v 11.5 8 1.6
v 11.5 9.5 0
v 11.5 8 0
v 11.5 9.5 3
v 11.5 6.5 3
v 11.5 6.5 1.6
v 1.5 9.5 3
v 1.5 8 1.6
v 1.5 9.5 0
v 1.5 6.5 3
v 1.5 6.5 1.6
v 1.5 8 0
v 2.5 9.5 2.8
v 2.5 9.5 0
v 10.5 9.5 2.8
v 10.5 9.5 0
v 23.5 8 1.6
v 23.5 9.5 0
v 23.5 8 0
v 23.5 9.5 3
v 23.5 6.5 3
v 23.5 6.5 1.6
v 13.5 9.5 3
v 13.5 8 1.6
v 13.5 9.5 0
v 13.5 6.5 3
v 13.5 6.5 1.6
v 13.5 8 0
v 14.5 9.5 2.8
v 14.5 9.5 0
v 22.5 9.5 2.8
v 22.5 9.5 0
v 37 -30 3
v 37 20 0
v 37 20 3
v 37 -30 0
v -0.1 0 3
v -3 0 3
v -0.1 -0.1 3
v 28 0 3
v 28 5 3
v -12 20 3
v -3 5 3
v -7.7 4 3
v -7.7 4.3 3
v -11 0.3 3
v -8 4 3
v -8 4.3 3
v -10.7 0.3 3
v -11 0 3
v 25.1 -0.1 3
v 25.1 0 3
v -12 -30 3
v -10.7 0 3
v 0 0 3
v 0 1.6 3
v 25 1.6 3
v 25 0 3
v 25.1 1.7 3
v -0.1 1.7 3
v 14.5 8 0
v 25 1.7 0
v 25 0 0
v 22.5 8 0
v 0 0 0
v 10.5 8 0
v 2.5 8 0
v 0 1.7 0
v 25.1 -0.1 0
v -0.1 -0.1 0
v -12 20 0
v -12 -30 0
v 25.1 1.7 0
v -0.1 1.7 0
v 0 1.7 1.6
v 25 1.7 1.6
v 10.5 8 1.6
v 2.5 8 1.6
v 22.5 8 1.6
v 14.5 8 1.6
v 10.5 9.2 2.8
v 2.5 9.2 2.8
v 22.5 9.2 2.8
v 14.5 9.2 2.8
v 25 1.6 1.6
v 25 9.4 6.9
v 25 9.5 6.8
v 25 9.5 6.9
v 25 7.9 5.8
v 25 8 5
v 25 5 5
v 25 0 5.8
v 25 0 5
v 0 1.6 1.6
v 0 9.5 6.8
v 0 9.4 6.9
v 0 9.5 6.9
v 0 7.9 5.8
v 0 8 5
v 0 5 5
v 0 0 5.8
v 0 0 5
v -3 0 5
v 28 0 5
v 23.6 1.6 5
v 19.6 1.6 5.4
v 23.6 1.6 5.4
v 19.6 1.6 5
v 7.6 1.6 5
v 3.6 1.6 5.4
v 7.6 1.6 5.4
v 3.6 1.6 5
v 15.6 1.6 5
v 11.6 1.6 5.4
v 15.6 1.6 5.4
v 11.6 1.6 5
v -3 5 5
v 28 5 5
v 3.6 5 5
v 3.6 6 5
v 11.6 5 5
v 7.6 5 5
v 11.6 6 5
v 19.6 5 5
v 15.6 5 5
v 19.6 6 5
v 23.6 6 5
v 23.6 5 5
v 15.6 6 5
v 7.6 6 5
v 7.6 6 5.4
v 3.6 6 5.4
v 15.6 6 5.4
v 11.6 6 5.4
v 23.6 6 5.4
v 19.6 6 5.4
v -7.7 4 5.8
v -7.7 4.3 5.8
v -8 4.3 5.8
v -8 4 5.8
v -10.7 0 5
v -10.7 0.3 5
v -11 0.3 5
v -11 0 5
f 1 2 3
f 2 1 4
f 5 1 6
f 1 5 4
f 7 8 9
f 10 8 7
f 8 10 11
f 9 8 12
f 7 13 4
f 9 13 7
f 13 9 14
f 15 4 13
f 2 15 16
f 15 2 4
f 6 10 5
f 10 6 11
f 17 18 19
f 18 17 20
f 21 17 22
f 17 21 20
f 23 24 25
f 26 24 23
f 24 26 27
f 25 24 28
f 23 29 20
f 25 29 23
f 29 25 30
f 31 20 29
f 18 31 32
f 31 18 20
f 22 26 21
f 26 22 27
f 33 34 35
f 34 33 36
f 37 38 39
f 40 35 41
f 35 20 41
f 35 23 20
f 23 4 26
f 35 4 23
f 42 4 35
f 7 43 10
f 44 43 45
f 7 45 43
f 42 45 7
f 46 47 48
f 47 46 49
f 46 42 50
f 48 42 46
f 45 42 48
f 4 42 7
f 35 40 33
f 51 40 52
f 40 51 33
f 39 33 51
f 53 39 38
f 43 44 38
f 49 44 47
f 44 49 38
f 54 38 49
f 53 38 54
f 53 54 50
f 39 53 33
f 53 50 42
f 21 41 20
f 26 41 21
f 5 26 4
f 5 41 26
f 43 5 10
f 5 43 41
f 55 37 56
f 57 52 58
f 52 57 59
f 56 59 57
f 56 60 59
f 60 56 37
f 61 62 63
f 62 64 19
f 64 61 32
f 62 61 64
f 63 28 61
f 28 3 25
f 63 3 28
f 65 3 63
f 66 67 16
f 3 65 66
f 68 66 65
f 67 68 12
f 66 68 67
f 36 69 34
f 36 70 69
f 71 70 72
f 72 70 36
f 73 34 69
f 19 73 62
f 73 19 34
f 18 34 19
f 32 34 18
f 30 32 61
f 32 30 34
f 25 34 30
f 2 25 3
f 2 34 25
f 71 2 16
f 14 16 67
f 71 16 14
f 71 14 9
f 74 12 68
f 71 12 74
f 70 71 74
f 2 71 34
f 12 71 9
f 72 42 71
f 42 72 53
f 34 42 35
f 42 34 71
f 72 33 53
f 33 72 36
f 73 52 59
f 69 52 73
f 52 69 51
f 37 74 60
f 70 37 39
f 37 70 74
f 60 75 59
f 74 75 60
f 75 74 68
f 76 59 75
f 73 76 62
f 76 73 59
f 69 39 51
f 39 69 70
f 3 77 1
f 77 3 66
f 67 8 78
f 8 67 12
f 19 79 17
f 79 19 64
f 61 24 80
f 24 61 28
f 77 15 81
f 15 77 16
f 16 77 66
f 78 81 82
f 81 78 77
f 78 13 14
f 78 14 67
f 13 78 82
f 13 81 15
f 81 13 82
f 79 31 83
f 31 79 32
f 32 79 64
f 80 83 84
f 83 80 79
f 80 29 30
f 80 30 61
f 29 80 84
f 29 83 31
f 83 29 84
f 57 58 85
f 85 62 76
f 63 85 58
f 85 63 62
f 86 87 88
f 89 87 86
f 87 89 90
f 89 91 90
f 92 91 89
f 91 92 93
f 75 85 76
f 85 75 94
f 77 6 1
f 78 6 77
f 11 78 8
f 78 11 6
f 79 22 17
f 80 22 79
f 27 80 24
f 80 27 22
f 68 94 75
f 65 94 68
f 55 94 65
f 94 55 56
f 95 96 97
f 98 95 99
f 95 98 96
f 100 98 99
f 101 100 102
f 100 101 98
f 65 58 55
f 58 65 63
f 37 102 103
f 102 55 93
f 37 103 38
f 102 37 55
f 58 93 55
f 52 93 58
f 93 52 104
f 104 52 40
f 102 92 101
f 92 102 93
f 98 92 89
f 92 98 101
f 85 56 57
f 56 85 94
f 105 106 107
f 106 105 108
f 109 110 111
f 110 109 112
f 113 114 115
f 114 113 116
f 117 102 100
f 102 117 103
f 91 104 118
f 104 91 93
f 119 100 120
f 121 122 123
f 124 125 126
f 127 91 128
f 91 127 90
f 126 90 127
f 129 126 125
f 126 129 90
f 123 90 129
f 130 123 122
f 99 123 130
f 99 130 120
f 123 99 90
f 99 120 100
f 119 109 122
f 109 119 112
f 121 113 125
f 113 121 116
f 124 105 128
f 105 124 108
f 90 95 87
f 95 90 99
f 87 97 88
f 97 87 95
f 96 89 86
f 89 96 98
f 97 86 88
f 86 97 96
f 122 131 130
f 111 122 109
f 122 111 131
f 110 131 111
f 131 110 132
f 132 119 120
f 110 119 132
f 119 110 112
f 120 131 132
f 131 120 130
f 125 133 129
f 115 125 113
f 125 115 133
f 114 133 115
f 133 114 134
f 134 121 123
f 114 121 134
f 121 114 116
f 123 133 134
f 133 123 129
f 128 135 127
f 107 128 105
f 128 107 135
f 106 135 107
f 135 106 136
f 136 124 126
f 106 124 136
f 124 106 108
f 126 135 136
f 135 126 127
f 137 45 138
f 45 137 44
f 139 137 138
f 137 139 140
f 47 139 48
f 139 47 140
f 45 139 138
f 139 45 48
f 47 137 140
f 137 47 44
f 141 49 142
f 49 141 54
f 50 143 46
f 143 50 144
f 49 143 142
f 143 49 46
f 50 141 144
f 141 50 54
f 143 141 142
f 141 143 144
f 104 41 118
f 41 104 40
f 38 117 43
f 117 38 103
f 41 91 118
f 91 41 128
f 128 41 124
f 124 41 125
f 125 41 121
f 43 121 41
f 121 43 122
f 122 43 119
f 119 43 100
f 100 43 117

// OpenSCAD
// ============================================================
// TESTE DE MONTAGEM — CLIP GM CABINE + MDF + FILTRO
// Abra no OpenSCAD → F5 (preview) → gire com mouse
// ============================================================
// MUDE 'vista' PARA TESTAR:
//   1 = Montado, 2 = Explodido, 3 = Corte, 4 = Animação
// ============================================================

vista = 1;        // [1:Montado, 2:Explodido, 3:Corte, 4:Animação]
explode = 12;

// === PARÂMETROS DO CLIP GM CABINE ===
mdf = 3;
filtro_borda_esp = 2;
filtro_borda_larg = 5;
clip_larg = 25;
clip_parede = 1.6;
aba_comp = 8;
aba_esp = 0.8;
base_prof = 8;
dente_h = 1.2;
dente_w = 8;
dente_pos = 6;
slot_w = 10;
slot_prof = 2;

module clip_gm() {
    difference() {
        union() {
            // Base
            cube([clip_larg, base_prof, clip_parede]);
            // Parede
            cube([clip_larg, clip_parede, mdf + filtro_borda_esp + aba_esp]);
            // Aba ultra-fina
            translate([0, 0, mdf + filtro_borda_esp])
                cube([clip_larg, aba_comp, aba_esp]);
            // Ponta curvada
            translate([0, aba_comp - 0.1, mdf + filtro_borda_esp])
                hull() {
                    cube([clip_larg, 0.1, aba_esp]);
                    translate([0, 1.5, aba_esp + 1])
                        cube([clip_larg, 0.1, 0.1]);
                }
            // Dentes
            for (dx = [clip_larg/2 - dente_pos - dente_w/2,
                       clip_larg/2 + dente_pos - dente_w/2])
                translate([dx, base_prof, 0]) {
                    hull() {
                        cube([dente_w, 0.1, clip_parede]);
                        translate([0, dente_h, 0])
                            cube([dente_w, 0.1, clip_parede + dente_h]);
                    }
                    translate([0, dente_h, 0])
                        cube([dente_w, 0.4, clip_parede + dente_h]);
                }
        }
        // 3 ranhuras de flexão
        for (i = [0:2])
            translate([clip_parede + 2 + i*8, clip_parede, mdf + filtro_borda_esp - 0.1])
                cube([4, aba_comp - clip_parede - 2, 0.5]);
    }
}

module mdf_secao() {
    color("BurlyWood", 0.7)
    difference() {
        translate([-12, -30, 0])
            cube([clip_larg + 24, 50, mdf]);
        // Entalhe para parede do clip (25×2mm na borda do furo)
        translate([-0.1, -0.1, -0.1])
            cube([clip_larg + 0.2, clip_parede + 0.2, mdf + 0.2]);
        // Slots para dentes
        for (dx = [clip_larg/2 - dente_pos - slot_w/2,
                   clip_larg/2 + dente_pos - slot_w/2])
            translate([dx, base_prof - slot_prof + 0.5, -0.1])
                cube([slot_w, slot_prof + 1, mdf + 0.2]);
    }
}

module filtro_borda() {
    color("WhiteSmoke", 0.6)
    translate([-3, 0, mdf])
        cube([clip_larg + 6, filtro_borda_larg, filtro_borda_esp]);
}

module cotas() {
    color("Red") {
        translate([-8, base_prof/2, 0])
            cube([0.3, 0.3, mdf + filtro_borda_esp + aba_esp]);
        translate([-11, 0, 0]) cube([0.3, 0.3, mdf]);
        translate([-11, 0, mdf]) cube([0.3, 0.3, filtro_borda_esp]);
    }
    color("White") {
        translate([-22, -5, mdf/2])
            rotate([90,0,0]) text("MDF 3mm", size=1.5);
        translate([-28, -5, mdf + filtro_borda_esp/2])
            rotate([90,0,0]) text("Borda 2mm", size=1.5);
        translate([-22, -5, mdf + filtro_borda_esp + aba_esp/2])
            rotate([90,0,0]) text("Aba 0.8mm", size=1.5);
    }
}

// === VISTAS ===
if (vista == 1) {
    echo("=== GM CABINE: VERIFICAR ===");
    echo("1. Aba ultra-fina (0.8mm) faz pressão suave?");
    echo("2. Ranhuras permitem flexão sem quebrar?");
    echo("3. Borda de papelão (2mm) não amassa?");
    mdf_secao(); filtro_borda();
    color("Orange") clip_gm();
    cotas();
}
if (vista == 2) {
    translate([0,0,-explode]) mdf_secao();
    filtro_borda();
    translate([0,0,explode]) color("Orange") clip_gm();
}
if (vista == 3) {
    difference() {
        union() { mdf_secao(); filtro_borda(); color("Orange") clip_gm(); }
        translate([clip_larg/2, -40, -10])
            cube([clip_larg+20, 100, 40]);
    }
    cotas();
}
if (vista == 4) {
    mdf_secao(); filtro_borda();
    color("Orange") translate([0,0,20*(1-$t)]) clip_gm();
}
